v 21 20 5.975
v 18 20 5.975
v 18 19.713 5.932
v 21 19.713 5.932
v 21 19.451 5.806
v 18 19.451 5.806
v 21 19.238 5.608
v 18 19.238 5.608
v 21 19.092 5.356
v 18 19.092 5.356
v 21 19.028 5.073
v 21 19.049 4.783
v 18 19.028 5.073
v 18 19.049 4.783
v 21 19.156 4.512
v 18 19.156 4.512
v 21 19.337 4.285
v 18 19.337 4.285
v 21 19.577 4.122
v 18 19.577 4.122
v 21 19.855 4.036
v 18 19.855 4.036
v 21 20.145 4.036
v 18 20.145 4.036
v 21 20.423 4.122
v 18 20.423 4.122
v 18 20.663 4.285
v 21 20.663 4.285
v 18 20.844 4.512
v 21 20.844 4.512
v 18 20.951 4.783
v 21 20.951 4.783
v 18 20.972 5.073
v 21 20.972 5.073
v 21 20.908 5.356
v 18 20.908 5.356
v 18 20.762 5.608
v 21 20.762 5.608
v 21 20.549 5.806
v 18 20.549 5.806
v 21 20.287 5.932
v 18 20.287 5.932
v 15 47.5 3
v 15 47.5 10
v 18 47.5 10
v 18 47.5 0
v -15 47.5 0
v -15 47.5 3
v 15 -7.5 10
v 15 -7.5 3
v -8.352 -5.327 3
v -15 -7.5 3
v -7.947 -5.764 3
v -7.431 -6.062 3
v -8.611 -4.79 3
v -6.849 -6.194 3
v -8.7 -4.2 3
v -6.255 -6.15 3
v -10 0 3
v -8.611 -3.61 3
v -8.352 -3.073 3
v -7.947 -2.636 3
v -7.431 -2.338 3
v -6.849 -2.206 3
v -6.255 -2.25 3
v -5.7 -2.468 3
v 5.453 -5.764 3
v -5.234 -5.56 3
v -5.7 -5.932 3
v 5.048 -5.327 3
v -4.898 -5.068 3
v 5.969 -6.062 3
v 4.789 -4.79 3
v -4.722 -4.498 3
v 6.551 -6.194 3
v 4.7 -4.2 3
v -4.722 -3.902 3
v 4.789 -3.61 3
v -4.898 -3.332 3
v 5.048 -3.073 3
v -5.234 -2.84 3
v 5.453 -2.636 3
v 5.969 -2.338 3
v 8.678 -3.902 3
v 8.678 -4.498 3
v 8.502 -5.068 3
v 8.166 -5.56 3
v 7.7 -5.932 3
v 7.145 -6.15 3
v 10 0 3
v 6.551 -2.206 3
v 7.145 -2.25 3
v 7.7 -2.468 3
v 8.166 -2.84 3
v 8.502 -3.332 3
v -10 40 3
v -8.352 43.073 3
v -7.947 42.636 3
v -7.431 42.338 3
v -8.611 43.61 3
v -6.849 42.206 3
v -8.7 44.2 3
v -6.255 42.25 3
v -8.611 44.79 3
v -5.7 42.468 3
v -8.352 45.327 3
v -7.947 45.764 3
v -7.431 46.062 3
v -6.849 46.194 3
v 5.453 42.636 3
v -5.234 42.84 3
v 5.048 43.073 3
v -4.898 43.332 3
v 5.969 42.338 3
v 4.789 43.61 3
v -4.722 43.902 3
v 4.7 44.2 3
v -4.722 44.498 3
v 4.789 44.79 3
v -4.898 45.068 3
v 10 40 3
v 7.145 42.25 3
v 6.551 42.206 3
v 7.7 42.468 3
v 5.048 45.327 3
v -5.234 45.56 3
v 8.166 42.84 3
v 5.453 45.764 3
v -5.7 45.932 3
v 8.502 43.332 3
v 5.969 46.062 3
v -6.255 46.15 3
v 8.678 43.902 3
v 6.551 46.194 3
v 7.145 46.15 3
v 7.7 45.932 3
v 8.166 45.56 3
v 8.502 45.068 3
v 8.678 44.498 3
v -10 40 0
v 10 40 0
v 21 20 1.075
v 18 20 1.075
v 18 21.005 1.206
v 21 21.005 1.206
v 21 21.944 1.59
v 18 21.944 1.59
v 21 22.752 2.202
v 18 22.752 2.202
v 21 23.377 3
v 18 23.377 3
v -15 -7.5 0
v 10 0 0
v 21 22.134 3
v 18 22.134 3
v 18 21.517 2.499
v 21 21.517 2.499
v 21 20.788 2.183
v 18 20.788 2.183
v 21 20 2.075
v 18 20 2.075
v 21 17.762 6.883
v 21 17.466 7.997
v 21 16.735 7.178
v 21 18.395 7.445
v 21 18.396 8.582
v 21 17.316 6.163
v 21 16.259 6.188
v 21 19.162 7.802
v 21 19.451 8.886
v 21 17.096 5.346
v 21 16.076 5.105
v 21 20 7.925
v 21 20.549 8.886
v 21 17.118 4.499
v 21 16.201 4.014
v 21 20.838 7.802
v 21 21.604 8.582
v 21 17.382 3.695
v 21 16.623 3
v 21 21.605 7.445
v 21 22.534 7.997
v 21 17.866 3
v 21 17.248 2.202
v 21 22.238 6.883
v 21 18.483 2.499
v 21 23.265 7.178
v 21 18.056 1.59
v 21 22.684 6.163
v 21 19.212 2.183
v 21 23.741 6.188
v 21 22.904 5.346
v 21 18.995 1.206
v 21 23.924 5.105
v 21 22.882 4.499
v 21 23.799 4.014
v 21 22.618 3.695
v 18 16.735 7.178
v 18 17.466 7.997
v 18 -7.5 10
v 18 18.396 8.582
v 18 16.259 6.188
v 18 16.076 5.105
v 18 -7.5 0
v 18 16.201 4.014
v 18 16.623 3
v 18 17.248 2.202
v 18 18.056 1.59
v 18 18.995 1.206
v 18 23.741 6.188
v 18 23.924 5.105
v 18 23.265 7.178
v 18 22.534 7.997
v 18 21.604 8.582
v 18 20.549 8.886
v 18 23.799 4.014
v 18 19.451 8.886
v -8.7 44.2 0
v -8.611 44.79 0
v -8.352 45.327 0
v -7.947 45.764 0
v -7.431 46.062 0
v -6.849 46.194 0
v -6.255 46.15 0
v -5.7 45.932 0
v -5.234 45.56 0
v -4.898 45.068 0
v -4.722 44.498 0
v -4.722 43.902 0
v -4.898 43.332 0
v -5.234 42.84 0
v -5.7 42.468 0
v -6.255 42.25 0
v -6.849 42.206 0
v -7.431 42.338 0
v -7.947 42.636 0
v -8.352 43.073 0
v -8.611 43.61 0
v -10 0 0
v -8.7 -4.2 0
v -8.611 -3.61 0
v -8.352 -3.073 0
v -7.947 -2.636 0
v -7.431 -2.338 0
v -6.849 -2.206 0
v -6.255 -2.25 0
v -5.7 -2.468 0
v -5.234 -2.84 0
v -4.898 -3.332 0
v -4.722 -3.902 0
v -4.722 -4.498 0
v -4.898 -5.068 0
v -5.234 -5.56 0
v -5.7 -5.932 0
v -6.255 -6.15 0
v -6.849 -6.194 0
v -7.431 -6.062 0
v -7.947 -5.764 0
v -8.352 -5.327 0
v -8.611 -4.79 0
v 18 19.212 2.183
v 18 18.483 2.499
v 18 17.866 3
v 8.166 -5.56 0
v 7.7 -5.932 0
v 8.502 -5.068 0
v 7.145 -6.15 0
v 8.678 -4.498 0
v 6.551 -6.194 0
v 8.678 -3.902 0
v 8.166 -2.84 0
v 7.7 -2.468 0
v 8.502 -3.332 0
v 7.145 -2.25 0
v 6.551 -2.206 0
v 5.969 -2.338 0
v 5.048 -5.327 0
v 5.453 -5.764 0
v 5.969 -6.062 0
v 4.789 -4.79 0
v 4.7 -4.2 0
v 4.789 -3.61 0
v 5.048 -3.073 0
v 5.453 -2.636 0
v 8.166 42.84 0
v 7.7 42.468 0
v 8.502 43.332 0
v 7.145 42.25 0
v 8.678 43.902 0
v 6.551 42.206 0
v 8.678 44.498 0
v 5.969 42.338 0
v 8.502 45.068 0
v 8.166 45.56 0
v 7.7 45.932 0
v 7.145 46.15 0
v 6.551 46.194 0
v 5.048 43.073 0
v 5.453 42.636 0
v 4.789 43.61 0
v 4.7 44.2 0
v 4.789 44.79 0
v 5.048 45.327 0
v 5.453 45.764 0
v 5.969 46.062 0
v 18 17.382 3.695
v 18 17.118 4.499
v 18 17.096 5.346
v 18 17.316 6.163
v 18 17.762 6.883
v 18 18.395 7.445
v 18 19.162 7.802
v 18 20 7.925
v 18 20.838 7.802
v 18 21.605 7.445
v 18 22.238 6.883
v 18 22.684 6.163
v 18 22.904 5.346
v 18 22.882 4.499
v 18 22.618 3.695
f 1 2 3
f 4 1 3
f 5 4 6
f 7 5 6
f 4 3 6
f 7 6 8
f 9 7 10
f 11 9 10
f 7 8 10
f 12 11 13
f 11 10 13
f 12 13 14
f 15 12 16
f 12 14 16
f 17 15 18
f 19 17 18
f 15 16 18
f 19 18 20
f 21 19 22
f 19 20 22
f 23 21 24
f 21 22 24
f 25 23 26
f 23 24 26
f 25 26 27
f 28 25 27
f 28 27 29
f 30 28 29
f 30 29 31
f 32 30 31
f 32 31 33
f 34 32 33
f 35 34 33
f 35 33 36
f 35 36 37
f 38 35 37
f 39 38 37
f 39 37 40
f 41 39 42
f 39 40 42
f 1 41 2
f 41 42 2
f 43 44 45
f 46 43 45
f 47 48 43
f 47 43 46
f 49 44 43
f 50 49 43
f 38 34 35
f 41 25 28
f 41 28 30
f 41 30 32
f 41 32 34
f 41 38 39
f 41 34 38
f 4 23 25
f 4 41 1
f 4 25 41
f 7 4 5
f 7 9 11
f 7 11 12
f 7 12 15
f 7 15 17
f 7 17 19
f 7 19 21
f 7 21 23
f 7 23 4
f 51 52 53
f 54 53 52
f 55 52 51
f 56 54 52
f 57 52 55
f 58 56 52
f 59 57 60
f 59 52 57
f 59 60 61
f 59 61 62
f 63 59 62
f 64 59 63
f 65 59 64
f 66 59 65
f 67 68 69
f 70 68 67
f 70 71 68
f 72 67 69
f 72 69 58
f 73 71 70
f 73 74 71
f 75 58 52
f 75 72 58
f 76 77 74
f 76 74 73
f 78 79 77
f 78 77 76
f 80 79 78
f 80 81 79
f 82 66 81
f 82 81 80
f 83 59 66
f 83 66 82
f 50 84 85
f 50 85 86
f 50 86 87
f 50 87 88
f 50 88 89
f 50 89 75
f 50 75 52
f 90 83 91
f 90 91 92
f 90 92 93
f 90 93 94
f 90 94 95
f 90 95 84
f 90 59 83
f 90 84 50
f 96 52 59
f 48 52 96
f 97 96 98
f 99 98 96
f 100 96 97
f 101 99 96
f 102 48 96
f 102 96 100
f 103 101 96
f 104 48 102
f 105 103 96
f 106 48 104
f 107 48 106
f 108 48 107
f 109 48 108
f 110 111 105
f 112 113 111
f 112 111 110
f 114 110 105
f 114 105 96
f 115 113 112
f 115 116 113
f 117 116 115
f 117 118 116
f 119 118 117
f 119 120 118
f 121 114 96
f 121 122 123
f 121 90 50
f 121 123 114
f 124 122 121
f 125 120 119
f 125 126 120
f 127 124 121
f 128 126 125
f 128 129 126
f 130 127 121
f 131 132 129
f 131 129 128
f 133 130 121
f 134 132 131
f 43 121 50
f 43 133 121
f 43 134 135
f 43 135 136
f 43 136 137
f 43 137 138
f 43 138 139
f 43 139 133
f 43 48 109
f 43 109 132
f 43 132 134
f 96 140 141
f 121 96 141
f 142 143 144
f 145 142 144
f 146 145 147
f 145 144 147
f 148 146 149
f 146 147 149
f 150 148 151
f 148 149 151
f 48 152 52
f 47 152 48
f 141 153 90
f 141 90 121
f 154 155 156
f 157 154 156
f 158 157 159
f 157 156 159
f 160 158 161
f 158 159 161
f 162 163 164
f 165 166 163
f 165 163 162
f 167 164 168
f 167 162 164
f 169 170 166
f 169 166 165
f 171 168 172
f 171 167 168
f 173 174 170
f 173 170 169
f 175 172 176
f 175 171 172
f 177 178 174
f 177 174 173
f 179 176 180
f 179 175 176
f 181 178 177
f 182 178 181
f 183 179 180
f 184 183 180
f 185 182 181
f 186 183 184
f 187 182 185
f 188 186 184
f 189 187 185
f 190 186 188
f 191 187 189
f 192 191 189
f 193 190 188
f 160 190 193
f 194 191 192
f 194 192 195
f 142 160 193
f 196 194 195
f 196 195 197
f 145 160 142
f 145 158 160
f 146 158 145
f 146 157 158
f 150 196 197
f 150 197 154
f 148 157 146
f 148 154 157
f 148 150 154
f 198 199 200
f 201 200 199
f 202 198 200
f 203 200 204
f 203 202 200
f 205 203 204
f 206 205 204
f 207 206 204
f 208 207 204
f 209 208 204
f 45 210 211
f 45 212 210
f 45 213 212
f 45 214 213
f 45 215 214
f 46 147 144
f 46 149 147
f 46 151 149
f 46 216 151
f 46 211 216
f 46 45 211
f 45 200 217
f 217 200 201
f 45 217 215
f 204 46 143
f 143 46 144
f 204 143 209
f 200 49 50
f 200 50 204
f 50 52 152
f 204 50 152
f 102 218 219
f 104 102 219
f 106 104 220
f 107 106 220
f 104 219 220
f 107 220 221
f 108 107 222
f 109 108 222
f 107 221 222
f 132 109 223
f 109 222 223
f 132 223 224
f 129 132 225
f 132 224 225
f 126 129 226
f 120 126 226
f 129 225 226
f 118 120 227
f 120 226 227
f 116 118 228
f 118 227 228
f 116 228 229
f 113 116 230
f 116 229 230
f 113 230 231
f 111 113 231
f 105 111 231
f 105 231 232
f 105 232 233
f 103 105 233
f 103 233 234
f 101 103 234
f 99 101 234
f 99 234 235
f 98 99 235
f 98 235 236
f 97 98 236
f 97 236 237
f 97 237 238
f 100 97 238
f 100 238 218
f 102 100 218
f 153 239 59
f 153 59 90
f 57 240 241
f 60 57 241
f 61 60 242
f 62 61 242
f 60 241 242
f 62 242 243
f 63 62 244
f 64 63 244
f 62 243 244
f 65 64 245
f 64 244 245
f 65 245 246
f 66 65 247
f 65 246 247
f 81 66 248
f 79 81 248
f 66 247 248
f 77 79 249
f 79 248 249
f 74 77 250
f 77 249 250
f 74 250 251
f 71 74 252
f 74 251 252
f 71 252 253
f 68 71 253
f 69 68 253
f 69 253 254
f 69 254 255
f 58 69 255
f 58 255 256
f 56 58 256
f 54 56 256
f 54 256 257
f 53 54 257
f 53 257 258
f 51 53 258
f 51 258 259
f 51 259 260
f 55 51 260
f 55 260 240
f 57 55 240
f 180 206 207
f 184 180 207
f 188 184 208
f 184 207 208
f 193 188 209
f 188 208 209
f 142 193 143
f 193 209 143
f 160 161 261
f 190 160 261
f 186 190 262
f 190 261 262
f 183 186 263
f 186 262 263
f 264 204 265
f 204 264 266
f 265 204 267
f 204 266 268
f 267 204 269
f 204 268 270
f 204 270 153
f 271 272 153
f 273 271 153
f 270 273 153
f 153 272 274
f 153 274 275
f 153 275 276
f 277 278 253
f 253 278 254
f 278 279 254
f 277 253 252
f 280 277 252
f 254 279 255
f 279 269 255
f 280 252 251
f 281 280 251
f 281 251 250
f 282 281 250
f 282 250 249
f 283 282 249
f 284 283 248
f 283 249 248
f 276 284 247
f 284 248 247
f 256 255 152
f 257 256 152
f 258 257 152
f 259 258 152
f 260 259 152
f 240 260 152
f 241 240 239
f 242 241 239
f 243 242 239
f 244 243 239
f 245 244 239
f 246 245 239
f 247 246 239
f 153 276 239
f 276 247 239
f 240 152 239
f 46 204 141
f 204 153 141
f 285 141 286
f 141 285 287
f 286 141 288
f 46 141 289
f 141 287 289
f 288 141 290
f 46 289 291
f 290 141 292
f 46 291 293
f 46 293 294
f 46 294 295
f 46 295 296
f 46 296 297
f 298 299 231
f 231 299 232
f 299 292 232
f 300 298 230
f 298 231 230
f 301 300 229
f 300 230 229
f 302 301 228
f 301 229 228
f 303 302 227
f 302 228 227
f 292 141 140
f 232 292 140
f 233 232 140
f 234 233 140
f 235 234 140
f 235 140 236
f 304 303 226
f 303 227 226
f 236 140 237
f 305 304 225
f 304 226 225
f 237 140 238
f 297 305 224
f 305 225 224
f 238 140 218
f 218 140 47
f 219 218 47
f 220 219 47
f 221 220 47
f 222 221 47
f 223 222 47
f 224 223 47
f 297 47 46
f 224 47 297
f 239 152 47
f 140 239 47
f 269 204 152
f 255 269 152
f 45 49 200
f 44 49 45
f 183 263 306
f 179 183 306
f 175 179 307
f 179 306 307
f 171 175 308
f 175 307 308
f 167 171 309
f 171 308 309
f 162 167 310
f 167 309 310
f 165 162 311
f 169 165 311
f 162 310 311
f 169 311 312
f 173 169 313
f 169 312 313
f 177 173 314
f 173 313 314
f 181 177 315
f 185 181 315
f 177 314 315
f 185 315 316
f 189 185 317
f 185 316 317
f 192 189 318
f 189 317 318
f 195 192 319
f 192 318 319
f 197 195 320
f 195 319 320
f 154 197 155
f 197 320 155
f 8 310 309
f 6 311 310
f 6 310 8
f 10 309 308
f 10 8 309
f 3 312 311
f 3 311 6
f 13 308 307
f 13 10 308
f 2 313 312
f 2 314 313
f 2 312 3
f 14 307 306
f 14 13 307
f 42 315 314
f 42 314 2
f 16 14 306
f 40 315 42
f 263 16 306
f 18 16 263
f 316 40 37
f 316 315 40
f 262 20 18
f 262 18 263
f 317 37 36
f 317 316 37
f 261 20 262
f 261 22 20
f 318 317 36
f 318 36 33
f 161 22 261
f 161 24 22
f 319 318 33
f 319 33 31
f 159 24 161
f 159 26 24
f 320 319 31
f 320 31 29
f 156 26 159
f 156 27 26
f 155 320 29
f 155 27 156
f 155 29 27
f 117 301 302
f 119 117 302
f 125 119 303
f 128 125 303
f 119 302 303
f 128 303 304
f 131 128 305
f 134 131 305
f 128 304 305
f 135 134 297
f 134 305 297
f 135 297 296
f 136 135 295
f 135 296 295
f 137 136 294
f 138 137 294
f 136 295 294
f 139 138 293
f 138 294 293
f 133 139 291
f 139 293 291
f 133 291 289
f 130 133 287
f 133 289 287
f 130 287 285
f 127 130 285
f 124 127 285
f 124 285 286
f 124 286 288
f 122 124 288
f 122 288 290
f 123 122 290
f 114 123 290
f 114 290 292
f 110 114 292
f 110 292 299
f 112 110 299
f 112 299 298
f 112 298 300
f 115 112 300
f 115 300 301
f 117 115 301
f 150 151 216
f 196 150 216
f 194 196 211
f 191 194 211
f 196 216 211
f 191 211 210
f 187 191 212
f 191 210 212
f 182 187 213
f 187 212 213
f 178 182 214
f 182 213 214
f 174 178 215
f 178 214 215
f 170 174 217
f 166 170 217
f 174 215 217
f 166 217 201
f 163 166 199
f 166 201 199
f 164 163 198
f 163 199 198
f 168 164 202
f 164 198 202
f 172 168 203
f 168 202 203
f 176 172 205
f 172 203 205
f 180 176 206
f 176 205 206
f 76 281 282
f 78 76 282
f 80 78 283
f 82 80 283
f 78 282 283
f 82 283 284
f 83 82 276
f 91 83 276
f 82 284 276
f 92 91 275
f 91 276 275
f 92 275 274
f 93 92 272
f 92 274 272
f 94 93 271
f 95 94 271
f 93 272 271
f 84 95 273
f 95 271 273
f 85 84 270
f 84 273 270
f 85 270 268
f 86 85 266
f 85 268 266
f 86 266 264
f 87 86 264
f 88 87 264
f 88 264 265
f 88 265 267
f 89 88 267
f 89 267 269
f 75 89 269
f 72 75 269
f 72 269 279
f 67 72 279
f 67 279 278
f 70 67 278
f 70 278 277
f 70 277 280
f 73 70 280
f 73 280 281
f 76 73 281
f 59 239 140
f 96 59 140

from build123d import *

# Parameters (mm, degrees)
SKETCH1_W                    = 30
SKETCH1_H                    = 55
SKETCH1_W_2                  = 20
SKETCH1_H_2                  = 40
SERVO_MOUNT_DEPTH            = 3
F_4_0_4_DIAMETER_HOLE1_D     = 4
F_4_0_4_DIAMETER_HOLE1_DEPTH = 4
F_4_0_4_DIAMETER_HOLE1_TIP   = 1.201721238
SKETCH4_W                    = 10
SKETCH4_H                    = 55
AXLE_MOUNT_BASE_DEPTH        = 3
AXLE_START                   = 3
SKETCH4_3_R                  = 0.975
AXLE_MOUNT_DEPTH             = 3


with BuildPart() as part:
    # Sketch1 → Servo Mount (new body)
    with BuildSketch(Plane.XY):
        with Locations((0, 20)):
            Rectangle(SKETCH1_W, SKETCH1_H)
        with Locations((0, 20)):
            Rectangle(SKETCH1_W_2, SKETCH1_H_2, mode=Mode.SUBTRACT)
    extrude(amount=SERVO_MOUNT_DEPTH)

    # Ø4.0 (4) Diameter Hole1
    with Locations(Plane.XY.offset(3)):
        with Locations((-6.7, 44.2), (-6.7, -4.2), (6.7, 44.2), (6.7, -4.2)):
            Hole(F_4_0_4_DIAMETER_HOLE1_D / 2, depth=F_4_0_4_DIAMETER_HOLE1_DEPTH)
            with Locations((0, 0, -(F_4_0_4_DIAMETER_HOLE1_DEPTH + F_4_0_4_DIAMETER_HOLE1_TIP / 2))):  # 118° drill point
                Cone(0, F_4_0_4_DIAMETER_HOLE1_D / 2, F_4_0_4_DIAMETER_HOLE1_TIP, mode=Mode.SUBTRACT)

    # Sketch4 → Axle Mount Base (add)
    with BuildSketch(Plane(origin=(15, 0, 0), x_dir=(0, 0, -1), z_dir=(1, 0, 0))):
        with Locations((-5, 20)):
            Rectangle(SKETCH4_W, SKETCH4_H)
    extrude(amount=AXLE_MOUNT_BASE_DEPTH)

    # Sketch4<3> → Axle Mount (add)
    with BuildSketch(Plane(origin=(15, 0, 0), x_dir=(0, 0, -1), z_dir=(1, 0, 0)).offset(AXLE_START)):
        with BuildLine():
            Line((-3, 17.865608986), (-3, 16.622778509))
            ThreePointArc((-3, 16.622778509), (-1.590042156, 18.056340436), (-1.075, 20))
            ThreePointArc((-1.075, 20), (-1.590042156, 21.943659564), (-3, 23.377221491))
            Line((-3, 23.377221491), (-3, 22.134391014))
            ThreePointArc((-3, 22.134391014), (-2.3161944, 21.163104681), (-2.075, 20))
            ThreePointArc((-2.075, 20), (-2.3161944, 18.836895319), (-3, 17.865608986))
        make_face()
        with BuildLine():
            ThreePointArc((-3, 23.377221491), (-8.925, 20), (-3, 16.622778509))
            Line((-3, 16.622778509), (-3, 17.865608986))
            ThreePointArc((-3, 17.865608986), (-7.925, 20), (-3, 22.134391014))
            Line((-3, 22.134391014), (-3, 23.377221491))
        make_face()
        with Locations(Location((-5, 20, 0), (0, 0, 180))):
            Circle(SKETCH4_3_R)
    extrude(amount=AXLE_MOUNT_DEPTH)


solid = part.part
